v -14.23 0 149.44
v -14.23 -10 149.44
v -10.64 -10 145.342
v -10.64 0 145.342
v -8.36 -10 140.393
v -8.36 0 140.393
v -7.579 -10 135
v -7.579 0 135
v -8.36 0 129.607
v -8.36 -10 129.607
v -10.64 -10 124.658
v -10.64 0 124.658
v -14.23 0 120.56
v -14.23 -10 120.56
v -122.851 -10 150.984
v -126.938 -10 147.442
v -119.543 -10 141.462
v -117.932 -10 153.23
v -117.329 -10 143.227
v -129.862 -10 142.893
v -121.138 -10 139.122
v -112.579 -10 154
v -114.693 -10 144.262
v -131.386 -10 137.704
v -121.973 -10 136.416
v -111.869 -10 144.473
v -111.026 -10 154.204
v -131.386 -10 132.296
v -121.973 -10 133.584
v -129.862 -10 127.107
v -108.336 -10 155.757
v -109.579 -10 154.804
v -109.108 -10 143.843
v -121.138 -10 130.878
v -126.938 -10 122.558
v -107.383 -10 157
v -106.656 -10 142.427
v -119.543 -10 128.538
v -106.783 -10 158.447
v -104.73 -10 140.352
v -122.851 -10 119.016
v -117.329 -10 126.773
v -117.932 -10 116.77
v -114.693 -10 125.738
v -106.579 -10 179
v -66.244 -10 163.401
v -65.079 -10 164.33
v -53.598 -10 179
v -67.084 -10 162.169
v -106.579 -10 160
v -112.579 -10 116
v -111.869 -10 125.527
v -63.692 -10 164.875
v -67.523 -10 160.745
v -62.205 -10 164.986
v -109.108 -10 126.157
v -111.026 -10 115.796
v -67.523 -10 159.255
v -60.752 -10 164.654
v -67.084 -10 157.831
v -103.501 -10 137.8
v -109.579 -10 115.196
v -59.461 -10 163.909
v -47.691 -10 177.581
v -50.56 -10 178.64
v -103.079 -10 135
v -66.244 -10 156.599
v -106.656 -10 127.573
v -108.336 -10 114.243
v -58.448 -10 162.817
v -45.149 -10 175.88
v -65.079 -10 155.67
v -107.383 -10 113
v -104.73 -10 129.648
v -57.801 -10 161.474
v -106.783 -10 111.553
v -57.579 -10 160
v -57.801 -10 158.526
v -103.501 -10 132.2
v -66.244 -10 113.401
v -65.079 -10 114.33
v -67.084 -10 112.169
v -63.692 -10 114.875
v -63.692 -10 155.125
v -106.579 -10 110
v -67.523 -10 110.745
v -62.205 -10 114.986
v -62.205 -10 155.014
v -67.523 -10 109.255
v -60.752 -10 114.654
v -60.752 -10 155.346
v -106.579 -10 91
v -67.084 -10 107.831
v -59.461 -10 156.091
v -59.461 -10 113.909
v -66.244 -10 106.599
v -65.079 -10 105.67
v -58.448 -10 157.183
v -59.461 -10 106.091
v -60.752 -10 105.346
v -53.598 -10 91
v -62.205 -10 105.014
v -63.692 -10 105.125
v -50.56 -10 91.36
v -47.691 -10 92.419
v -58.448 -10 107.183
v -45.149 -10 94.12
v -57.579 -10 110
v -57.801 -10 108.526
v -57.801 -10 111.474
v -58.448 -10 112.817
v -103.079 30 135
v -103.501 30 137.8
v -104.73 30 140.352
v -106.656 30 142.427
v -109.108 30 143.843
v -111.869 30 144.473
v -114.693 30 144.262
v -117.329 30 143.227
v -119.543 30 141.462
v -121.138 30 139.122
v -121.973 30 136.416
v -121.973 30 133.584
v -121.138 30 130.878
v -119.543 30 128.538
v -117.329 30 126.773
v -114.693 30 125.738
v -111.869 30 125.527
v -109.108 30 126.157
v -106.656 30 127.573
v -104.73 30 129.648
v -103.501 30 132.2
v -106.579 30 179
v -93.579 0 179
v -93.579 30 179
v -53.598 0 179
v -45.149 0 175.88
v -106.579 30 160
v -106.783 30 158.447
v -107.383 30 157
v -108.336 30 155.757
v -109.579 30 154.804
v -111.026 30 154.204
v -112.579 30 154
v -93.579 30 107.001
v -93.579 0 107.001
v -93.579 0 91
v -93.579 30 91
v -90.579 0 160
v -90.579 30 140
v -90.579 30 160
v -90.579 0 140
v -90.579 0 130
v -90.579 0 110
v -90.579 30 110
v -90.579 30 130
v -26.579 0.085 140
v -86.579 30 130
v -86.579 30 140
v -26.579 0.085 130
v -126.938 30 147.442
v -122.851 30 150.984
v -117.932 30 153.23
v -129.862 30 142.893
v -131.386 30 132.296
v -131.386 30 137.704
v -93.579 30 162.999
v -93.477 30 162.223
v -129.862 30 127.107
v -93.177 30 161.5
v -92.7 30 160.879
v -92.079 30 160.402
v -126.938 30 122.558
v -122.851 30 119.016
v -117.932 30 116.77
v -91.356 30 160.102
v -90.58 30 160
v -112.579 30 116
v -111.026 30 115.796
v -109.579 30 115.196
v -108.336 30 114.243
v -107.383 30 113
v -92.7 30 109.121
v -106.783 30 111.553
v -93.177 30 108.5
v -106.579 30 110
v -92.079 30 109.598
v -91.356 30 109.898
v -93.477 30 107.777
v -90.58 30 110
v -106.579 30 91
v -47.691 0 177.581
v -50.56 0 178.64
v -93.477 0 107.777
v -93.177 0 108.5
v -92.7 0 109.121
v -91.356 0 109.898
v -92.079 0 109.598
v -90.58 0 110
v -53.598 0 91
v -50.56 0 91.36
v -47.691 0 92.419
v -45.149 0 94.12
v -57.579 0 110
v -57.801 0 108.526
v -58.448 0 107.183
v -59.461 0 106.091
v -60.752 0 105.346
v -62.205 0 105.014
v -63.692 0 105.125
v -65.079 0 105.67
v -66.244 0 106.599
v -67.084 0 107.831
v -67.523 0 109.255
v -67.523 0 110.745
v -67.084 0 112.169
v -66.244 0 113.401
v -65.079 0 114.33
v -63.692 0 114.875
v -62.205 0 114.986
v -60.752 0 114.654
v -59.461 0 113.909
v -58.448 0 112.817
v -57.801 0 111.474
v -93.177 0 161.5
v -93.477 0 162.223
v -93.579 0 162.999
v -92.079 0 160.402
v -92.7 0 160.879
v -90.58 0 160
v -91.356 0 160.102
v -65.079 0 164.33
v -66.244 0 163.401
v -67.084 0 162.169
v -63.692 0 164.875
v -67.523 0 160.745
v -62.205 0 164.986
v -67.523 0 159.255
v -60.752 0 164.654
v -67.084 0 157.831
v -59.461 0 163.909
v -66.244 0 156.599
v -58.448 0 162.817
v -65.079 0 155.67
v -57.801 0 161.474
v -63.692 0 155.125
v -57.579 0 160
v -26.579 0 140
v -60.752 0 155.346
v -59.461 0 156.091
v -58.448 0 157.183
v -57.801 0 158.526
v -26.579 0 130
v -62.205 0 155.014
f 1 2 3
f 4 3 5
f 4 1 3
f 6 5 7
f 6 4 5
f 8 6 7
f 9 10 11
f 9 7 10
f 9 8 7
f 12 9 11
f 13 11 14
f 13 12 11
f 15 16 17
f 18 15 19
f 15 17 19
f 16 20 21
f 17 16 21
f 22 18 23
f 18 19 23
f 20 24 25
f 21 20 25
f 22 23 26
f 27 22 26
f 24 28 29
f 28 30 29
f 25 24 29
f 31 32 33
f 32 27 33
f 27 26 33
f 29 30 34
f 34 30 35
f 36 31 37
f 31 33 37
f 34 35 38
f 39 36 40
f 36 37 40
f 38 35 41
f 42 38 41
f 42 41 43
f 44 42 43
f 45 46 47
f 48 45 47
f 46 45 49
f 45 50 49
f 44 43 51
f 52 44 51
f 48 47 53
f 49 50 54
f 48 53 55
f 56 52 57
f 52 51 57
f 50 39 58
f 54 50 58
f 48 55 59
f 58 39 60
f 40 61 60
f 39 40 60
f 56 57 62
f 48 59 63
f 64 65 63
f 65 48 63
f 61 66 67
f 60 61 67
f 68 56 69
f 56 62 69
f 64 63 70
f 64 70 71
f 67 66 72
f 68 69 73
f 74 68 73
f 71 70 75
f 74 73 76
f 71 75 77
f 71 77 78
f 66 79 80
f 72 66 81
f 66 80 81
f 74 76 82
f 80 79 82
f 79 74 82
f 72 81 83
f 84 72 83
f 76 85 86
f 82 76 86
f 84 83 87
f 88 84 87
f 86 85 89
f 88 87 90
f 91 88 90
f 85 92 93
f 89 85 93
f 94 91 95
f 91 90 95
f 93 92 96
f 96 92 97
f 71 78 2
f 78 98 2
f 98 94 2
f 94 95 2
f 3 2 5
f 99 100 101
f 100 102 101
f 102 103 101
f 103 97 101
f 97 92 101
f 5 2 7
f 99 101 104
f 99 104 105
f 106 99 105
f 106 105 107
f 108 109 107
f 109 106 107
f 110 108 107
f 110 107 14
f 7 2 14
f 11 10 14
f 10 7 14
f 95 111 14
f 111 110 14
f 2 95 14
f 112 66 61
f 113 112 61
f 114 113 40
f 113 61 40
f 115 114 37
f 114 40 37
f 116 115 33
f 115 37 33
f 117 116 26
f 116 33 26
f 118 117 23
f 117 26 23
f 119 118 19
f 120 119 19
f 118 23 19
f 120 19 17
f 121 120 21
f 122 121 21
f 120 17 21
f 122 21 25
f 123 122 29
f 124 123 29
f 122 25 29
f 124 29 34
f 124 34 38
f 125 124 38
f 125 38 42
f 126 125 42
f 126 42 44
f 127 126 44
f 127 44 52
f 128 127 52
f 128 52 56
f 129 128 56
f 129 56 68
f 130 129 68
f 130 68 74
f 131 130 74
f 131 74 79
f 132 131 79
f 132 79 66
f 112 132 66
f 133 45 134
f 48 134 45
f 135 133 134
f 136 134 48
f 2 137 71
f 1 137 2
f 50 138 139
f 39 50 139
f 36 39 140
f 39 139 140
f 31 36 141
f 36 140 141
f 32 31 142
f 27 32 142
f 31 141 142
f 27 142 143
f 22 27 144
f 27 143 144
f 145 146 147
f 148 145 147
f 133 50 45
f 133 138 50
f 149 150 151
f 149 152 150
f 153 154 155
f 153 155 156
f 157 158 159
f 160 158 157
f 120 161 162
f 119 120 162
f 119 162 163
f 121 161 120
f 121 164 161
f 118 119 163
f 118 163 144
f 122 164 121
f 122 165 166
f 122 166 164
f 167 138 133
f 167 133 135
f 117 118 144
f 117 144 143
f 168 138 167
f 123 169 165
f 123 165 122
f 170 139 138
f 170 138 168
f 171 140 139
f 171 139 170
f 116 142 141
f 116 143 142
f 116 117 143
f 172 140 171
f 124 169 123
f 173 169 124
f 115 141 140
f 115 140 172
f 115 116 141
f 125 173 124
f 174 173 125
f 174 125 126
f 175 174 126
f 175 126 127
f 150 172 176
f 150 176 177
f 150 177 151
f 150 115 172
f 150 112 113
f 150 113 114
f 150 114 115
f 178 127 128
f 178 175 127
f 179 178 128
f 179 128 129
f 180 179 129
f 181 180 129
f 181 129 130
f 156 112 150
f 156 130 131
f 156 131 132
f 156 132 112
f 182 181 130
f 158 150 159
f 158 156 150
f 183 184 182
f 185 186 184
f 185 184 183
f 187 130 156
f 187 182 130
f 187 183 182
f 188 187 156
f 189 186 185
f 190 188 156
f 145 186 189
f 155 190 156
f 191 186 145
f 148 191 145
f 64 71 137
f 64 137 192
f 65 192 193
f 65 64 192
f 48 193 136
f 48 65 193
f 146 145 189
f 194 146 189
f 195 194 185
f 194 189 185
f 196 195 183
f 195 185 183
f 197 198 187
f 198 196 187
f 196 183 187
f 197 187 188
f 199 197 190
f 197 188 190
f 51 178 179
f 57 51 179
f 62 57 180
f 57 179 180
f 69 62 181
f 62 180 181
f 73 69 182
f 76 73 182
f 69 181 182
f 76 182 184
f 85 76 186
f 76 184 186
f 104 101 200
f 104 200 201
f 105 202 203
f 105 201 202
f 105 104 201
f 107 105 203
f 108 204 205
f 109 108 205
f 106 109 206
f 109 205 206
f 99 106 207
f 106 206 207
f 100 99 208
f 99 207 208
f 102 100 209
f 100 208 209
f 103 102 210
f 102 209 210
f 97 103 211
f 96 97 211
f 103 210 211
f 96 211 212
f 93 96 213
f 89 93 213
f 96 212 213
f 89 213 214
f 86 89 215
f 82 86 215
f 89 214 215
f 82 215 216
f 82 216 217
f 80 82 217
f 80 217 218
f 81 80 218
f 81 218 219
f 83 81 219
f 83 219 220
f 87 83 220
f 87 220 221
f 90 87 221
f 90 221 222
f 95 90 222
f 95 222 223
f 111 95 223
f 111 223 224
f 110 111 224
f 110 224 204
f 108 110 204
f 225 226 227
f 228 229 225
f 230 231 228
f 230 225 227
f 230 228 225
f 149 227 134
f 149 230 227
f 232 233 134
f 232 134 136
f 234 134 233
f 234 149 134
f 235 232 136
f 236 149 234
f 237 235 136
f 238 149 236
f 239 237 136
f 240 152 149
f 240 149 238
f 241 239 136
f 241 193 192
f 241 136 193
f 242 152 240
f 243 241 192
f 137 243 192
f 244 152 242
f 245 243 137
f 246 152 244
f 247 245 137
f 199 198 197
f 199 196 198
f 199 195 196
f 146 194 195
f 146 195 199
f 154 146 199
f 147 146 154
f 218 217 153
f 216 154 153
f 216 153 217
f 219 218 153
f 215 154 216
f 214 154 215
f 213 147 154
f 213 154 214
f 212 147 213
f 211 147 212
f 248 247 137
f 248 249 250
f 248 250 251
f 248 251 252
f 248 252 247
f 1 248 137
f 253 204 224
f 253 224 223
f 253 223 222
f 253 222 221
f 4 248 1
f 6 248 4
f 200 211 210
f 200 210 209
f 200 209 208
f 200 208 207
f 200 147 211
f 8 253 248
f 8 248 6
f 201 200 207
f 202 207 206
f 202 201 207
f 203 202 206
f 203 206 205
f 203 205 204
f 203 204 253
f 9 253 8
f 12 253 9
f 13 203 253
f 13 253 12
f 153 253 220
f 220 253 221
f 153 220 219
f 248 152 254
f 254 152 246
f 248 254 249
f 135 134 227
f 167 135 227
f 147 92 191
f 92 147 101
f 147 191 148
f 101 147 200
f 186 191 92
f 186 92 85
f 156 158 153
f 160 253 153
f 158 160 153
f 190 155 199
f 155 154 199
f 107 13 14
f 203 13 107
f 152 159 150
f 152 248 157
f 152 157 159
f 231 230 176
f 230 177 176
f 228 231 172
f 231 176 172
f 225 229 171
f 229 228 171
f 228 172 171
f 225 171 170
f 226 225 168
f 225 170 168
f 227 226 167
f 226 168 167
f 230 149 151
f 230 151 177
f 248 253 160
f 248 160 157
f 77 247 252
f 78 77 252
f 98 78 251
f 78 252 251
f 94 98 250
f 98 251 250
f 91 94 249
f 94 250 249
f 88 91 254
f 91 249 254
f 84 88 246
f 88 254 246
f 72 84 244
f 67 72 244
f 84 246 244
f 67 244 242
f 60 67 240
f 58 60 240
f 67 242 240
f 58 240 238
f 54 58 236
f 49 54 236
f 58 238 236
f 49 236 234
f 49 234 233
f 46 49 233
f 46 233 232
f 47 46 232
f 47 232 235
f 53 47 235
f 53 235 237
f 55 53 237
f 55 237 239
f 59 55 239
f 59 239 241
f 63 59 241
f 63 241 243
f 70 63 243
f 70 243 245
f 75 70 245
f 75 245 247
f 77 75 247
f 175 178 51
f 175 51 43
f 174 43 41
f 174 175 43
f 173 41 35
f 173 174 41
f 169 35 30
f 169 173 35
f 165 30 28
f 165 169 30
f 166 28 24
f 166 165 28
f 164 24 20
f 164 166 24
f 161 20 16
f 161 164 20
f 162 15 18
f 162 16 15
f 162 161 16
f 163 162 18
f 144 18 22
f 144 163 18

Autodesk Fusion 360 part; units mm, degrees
sketch "Sketch1" plane through (0, 0, 0) normal (0, 1, 0) x (1, 0, 0)
  line L0 (-93.5789, -91) -> (-48.797, -91)
  line L1 (-48.797, -91) -> (-48.797, -179)
  line L2 (-48.797, -179) -> (-93.5789, -179)
  line L3 (-93.5789, -179) -> (-93.5789, -91)
  line L4 (-48.797, -179) -> (2.6553, -135)
  line L5 (2.6553, -135) -> (-48.797, -91)
  line L6 (-93.5789, -91) -> (-148.2679, -91)
  line L7 (-148.2679, -91) -> (-148.2679, -179)
  line L8 (-148.2679, -179) -> (-93.5789, -179)
  line L9 (2.6553, -135) -> (-148.2679, -135)
  line L10 (-90.5789, -91) -> (-90.5789, -179)
  line L11 (-26.5789, -110) -> (-26.5789, -160)
  line L12 (-26.5789, -130) -> (-90.5789, -130)
  line L13 (-26.5789, -140) -> (-90.5789, -140)
  line L14 (-26.5789, -110) -> (-90.5789, -110)
  line L15 (-26.5789, -160) -> (-90.5789, -160)
  line L16 (-62.5789, -91) -> (-62.5789, -179)
  circle A0 centre (-62.5789, -110) radius 5
  circle A1 centre (-62.5789, -160) radius 5
  line L17 (-106.5789, -91) -> (-106.5789, -179)
  line L18 (-112.5789, -91) -> (-112.5789, -179)
  line L19 (-86.5789, -140) -> (-86.5789, -130)
  circle A2 centre (-112.5789, -135) radius 9.5
  circle A3 centre (-112.5789, -135) radius 19
  line L20 (-26.5789, -135) -> (-14.2304, -120.56)
  line L21 (-26.5789, -135) -> (-14.2304, -149.44)
  circle A4 centre (-26.5789, -135) radius 19
  line L22 (-90.5789, -160) -> (-93.5789, -160)
  line L23 (-90.5789, -130) -> (-93.5789, -130)
  line L24 (-90.5789, -110) -> (-93.5789, -110)
  line L25 (-90.5789, -140) -> (-93.5789, -140)
  dimension "d1" = 3
  dimension "d2" = 5
  dimension "d3" = 10
  dimension "d4" = 50
  dimension "d7" = 88
  dimension "d8" = 67
  dimension "d10" = 31
  dimension "d11" = 36
  dimension "d12" = 10
  dimension "d13" = 10
  dimension "d16" = 13
  dimension "d17" = 19
  dimension "d18" = 20
  dimension "d19" = 19
  dimension "d20" = 38
  dimension "d22" = 19
  dimension "d23" = 19
  dimension "d24" = 13.782
extrude "Extrude1" add sketch "Sketch1" against normal blind 10 contours L0 L3 L10 L24 | L3 L6 L17 A3 | L0 L10 L14 L16 A0 | L3 L10 L23 L24 | L0 L1 L14 L16 A0 | L10 L12 L14 L16 A0 | L3 L9 L10 L23 | L9 L17 A2 A3 | L17 L18 A2 A3 | L1 L5 L14 | L9 L10 L12 L19 | L3 L9 L10 L25 | L9 L17 A2 A3 | L3 L8 L17 A3 | L9 L18 A2 A3 | L1 L11 L12 L14 A4 | L1 L12 L14 L16 A0 | L5 L11 A4 | L9 L10 L13 L19 | L9 L12 L16 L19 | L3 L10 L22 L25 | L17 L18 A2 A3 | L9 L18 A2 A3 | L1 L9 L12 A4 | L1 L9 L12 L16 | L9 L20 A4 | L11 L20 A4 | L11 L12 A4 | L9 L13 L16 L19 | L10 L13 L15 L16 A1 | L2 L3 L10 L22 | L1 L9 L13 A4 | L1 L9 L13 L16 | L9 L11 L12 A4 | L9 L11 L13 A4 | L11 L21 A4 | L9 L21 A4 | L2 L10 L15 L16 A1 | L1 L11 L13 L15 A4 | L1 L13 L15 L16 A1 | L4 L11 A4 | L11 L13 A4 | L1 L4 L15 | L1 L2 L15 L16 A1 makes body 1
extrude "Extrude2" add sketch "Sketch1" along normal blind 30 contours L3 L6 L17 A3 | L3 L10 L23 L24 | L3 L9 L10 L23 | L9 L17 A2 A3 | L17 L18 A2 A3 | L9 L10 L12 L19 | L3 L9 L10 L25 | L9 L17 A2 A3 | L3 L8 L17 A3 | L9 L18 A2 A3 | L9 L10 L13 L19 | L3 L10 L22 L25 | L17 L18 A2 A3 | L9 L18 A2 A3 bodies 1
extrude "Extrude3" add sketch "Sketch1" along normal blind 30 separate body contours L9 L12 L16 L19 | L1 L9 L12 A4 | L1 L9 L12 L16 | L9 L13 L16 L19 | L1 L9 L13 A4 | L1 L9 L13 L16 | L9 L11 L12 A4 | L9 L11 L13 A4 makes body 2
draft "Draft1" angle -26.5 neutral plane through (-86.5789, 0, 135) pull (-1, 0, 0) 1 faces at (-46.5789, 30, 133.3333) on bodies 2
combine "Combine1" operation add target body 2 tool bodies 1
fillet "Fillet1" radius 13 1 edges at (-48.797, -5, 179) on bodies 2
fillet "Fillet2" radius 13 1 edges at (-48.797, -5, 91) on bodies 2
fillet "Fillet3" radius 3 1 edges at (-93.5789, 15, 160) on bodies 2
fillet "Fillet4" radius 3 1 edges at (-93.5789, 15, 110) on bodies 2
fillet "Fillet5" radius 6 1 edges at (-106.5789, 10, 153.0278) on bodies 2
fillet "Fillet6" radius 6 1 edges at (-106.5789, 10, 116.9722) on bodies 2
